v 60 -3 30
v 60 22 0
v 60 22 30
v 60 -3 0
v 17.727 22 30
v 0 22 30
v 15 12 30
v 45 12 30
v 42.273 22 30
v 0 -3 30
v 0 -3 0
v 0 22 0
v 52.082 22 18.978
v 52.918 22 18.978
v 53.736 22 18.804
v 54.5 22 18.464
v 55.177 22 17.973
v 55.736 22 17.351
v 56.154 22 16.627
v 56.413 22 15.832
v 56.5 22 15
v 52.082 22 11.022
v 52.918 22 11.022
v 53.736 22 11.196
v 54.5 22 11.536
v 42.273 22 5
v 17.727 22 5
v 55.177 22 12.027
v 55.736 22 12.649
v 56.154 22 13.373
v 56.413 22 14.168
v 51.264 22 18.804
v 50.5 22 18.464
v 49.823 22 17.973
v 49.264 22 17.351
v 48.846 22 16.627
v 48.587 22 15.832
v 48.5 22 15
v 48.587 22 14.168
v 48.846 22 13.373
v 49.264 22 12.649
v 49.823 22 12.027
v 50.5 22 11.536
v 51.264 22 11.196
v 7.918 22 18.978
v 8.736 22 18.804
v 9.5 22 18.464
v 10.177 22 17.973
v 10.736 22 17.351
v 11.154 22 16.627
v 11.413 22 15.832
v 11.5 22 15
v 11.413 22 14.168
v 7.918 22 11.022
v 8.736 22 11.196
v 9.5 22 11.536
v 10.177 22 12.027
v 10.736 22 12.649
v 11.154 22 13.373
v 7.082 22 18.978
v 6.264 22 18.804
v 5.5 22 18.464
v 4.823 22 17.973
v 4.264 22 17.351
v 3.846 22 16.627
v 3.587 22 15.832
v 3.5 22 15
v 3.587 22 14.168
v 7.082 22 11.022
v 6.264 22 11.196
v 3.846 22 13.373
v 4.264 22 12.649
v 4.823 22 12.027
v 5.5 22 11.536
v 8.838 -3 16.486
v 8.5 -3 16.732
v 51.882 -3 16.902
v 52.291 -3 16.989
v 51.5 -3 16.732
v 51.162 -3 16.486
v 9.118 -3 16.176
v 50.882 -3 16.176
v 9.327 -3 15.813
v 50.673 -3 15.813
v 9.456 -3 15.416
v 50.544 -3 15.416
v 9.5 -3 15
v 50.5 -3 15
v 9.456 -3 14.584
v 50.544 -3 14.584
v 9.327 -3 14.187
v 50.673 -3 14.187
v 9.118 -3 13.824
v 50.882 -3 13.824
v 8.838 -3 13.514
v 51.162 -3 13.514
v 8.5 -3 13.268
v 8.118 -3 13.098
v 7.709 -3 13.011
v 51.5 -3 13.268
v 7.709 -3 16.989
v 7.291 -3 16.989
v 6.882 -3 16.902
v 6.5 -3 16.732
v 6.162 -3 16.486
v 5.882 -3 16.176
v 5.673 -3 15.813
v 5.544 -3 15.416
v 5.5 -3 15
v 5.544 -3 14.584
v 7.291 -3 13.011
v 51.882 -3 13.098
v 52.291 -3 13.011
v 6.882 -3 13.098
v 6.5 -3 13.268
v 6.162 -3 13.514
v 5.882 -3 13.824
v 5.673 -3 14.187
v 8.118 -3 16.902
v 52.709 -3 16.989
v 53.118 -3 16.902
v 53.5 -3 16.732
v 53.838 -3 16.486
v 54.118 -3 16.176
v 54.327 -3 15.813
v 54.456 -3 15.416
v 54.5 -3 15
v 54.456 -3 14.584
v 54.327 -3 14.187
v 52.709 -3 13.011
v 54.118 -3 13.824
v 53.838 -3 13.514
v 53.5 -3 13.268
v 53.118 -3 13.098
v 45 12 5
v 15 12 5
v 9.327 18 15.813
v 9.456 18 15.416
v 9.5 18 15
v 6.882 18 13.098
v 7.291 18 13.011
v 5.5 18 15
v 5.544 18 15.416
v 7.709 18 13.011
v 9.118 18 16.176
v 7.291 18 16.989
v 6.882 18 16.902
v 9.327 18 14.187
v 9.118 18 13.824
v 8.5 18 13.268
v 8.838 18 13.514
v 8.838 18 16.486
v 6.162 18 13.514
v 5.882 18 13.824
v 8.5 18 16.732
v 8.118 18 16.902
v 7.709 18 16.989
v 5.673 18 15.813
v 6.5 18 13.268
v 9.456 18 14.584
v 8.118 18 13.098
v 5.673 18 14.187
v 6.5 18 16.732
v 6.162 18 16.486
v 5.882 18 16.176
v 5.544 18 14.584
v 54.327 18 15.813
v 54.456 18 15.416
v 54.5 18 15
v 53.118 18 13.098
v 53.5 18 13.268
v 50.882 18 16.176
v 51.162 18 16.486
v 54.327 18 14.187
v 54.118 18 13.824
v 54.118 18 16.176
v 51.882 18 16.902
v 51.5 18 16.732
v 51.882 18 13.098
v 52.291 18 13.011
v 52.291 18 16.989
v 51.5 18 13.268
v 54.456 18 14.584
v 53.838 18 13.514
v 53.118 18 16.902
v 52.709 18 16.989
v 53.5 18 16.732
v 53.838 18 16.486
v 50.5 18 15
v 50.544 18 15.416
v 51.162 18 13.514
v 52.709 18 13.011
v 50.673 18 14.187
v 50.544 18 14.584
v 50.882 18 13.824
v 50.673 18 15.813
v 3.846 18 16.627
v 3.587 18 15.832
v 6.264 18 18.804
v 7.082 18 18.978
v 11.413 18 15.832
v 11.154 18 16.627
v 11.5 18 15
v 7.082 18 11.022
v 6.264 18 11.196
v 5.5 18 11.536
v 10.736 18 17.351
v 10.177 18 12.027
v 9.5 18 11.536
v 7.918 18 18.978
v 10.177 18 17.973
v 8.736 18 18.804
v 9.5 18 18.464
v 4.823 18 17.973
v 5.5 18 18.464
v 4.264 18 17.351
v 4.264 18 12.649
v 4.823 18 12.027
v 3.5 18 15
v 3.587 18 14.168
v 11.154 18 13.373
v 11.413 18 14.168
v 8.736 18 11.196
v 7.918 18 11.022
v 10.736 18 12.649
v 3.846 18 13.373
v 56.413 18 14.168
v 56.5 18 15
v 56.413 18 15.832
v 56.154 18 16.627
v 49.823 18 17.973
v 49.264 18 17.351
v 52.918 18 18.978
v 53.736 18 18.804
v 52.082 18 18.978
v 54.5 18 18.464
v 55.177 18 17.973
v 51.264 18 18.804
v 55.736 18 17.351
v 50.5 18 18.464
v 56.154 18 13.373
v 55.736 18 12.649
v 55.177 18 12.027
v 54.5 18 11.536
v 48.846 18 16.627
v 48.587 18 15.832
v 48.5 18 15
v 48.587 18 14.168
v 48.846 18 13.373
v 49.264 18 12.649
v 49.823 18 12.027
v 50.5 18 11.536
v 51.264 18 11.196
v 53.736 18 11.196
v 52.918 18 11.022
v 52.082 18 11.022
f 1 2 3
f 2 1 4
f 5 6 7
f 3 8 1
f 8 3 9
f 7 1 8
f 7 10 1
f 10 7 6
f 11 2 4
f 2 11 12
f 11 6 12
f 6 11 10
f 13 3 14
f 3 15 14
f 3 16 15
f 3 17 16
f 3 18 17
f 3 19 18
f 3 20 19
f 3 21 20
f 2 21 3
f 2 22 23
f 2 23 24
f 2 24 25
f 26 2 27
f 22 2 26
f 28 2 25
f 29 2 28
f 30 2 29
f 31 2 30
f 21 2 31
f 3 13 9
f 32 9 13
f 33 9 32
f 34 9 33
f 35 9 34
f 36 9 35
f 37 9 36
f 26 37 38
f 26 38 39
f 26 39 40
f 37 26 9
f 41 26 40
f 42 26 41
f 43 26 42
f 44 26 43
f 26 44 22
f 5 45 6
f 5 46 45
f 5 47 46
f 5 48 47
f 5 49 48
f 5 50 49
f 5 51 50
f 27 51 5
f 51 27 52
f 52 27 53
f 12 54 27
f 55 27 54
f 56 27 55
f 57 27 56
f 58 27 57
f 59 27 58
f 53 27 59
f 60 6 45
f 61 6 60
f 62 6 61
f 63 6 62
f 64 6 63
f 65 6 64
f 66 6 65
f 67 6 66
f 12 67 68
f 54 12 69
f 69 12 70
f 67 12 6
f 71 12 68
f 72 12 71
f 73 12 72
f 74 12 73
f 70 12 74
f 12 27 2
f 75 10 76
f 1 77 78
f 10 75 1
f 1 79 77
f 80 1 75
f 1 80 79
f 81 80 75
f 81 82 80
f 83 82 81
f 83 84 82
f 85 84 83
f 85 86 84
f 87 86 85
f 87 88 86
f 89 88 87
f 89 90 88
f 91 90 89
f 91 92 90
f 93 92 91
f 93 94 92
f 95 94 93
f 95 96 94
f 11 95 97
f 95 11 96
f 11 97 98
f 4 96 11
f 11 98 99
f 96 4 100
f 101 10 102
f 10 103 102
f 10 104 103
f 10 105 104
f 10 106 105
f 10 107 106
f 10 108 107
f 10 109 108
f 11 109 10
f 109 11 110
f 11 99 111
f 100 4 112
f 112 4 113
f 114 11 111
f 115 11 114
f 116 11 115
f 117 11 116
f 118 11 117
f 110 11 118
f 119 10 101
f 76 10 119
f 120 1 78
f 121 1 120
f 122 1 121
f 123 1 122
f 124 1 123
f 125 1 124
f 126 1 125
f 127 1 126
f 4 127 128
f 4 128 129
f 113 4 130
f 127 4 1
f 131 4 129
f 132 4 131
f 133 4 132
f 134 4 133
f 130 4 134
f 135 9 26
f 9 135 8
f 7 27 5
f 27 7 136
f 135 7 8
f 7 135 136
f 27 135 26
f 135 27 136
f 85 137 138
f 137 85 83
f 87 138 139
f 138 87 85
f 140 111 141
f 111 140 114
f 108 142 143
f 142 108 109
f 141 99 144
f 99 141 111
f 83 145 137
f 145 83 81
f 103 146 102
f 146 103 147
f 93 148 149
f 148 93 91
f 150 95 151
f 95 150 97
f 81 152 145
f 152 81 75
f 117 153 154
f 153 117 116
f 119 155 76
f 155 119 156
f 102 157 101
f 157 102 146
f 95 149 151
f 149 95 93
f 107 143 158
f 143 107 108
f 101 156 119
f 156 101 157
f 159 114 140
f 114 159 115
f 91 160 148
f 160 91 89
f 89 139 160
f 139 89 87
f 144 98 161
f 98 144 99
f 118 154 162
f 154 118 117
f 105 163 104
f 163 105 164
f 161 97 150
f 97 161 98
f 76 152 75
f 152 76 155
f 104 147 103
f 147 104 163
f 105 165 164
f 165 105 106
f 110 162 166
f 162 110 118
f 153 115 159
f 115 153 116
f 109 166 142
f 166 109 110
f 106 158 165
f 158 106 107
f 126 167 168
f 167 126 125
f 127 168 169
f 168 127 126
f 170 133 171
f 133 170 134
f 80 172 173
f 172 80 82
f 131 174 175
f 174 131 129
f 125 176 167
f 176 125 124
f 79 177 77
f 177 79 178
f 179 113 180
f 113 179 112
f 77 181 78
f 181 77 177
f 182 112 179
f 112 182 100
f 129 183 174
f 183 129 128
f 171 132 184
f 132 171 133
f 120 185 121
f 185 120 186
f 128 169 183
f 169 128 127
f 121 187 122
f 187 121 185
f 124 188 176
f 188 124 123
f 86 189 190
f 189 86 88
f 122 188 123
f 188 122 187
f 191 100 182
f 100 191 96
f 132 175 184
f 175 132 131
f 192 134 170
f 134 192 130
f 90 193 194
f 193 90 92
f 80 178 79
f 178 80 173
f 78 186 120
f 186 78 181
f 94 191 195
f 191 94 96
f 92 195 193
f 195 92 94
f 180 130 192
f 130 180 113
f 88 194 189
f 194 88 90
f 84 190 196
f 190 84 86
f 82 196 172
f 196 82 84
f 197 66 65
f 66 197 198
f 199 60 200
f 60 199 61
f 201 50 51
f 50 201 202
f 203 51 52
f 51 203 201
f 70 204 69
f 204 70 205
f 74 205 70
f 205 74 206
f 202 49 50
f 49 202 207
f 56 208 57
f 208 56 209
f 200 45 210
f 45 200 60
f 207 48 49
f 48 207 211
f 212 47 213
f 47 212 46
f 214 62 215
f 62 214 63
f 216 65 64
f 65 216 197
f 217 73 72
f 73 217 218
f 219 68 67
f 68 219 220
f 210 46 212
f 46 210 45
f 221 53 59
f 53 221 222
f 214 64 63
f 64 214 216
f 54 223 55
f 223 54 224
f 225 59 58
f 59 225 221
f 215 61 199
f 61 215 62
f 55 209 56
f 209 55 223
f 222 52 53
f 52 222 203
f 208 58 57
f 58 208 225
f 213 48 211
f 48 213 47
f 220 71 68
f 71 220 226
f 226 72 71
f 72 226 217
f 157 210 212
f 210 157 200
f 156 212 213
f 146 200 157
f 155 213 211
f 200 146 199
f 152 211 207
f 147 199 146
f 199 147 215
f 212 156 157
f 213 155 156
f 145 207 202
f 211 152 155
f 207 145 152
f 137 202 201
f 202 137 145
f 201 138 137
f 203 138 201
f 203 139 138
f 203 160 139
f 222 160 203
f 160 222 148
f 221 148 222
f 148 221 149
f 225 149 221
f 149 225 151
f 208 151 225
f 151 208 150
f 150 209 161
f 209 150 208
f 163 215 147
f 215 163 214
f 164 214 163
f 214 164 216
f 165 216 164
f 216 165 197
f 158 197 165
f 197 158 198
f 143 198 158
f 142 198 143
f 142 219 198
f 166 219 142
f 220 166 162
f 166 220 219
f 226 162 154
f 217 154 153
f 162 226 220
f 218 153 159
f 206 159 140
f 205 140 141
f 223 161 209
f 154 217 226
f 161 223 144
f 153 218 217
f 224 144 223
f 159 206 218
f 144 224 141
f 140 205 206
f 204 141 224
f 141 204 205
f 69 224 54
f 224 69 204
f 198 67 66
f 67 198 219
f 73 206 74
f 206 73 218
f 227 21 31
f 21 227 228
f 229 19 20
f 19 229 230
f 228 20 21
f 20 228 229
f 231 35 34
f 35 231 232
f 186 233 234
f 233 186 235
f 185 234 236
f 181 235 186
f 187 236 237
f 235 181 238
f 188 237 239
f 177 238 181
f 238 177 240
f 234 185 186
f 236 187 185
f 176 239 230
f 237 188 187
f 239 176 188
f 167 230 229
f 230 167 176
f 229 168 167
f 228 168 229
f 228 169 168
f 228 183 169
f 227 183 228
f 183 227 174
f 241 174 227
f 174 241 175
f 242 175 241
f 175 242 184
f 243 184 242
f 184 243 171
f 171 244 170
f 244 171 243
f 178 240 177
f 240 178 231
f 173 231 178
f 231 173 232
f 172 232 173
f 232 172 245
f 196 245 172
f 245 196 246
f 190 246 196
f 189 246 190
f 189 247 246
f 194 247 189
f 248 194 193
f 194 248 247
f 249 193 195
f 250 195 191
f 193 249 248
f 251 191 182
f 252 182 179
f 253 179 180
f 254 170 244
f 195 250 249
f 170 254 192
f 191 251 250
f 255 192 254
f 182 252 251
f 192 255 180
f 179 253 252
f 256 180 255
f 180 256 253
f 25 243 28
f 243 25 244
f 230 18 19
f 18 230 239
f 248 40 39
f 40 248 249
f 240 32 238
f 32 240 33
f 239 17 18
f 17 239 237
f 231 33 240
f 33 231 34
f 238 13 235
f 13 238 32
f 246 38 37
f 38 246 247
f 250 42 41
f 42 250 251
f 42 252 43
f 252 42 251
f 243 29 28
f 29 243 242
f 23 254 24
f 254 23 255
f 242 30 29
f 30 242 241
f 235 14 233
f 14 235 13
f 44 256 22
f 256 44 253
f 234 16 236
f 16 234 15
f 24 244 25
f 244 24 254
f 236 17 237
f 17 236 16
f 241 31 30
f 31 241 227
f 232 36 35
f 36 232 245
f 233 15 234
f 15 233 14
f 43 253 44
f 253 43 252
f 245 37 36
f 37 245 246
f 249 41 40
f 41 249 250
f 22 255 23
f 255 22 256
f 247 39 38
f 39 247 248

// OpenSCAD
h = 30;
off = 15;
folga = 1;

trap_dif = 3;
trap_h = 10;
trap_l = 30;

paraf_r= 2;
paraf_h= 5;

translate([off, off*.8, 0]){


difference(){
translate([-off, -off,0])cube([trap_l + 2*off,trap_h + off,h]);
translate([0,0,5]
)linear_extrude(height = h + 5, center = false, convexity = 10) polygon(points=[[0,0],[trap_dif,trap_h + 1],[trap_l-trap_dif,trap_h + 1],[trap_l,0]]);

translate([-off/2,50,h/2]) rotate([90,0,0]) cylinder(r=paraf_r, h=200, $fn=30);
translate([trap_l + off/2,50,h/2]) rotate([90,0,0]) cylinder(r=paraf_r, h=200, $fn=30);

translate([-off/2,trap_h + 1,h/2]) rotate([90,0,0]) cylinder(r=paraf_r*2, h=paraf_h, $fn=30);
translate([trap_l + off/2,trap_h + 1,h/2]) rotate([90,0,0]) cylinder(r=paraf_r*2, h=paraf_h, $fn=30);

}
/*

difference(){
union(){
translate([-off, trap_h + folga,0])cube([trap_l + 2*off,trap_h + off*.5,h]);
translate([0,0,5]
)linear_extrude(height = h - 5, center = false, convexity = 10) polygon(points=[[folga,folga],[trap_dif + folga,trap_h + 1],[trap_l-trap_dif - folga,trap_h + 1],[trap_l - folga, + folga]]);
}

translate([-off/2,50,h/2]) rotate([90,0,0]) cylinder(r=paraf_r, h=200, $fn=30);
translate([trap_l + off/2,50,h/2]) rotate([90,0,0]) cylinder(r=paraf_r, h=200, $fn=30);

translate([-off/2, trap_h + folga + paraf_h-1,h/2]) rotate([90,0,0]) cylinder(r=paraf_r*2,  h=paraf_h, $fn=30);
translate([trap_l + off/2,trap_h + folga + paraf_h-1,h/2]) rotate([90,0,0]) cylinder(r=paraf_r*2, h=paraf_h, $fn=30);

}
*/
}
